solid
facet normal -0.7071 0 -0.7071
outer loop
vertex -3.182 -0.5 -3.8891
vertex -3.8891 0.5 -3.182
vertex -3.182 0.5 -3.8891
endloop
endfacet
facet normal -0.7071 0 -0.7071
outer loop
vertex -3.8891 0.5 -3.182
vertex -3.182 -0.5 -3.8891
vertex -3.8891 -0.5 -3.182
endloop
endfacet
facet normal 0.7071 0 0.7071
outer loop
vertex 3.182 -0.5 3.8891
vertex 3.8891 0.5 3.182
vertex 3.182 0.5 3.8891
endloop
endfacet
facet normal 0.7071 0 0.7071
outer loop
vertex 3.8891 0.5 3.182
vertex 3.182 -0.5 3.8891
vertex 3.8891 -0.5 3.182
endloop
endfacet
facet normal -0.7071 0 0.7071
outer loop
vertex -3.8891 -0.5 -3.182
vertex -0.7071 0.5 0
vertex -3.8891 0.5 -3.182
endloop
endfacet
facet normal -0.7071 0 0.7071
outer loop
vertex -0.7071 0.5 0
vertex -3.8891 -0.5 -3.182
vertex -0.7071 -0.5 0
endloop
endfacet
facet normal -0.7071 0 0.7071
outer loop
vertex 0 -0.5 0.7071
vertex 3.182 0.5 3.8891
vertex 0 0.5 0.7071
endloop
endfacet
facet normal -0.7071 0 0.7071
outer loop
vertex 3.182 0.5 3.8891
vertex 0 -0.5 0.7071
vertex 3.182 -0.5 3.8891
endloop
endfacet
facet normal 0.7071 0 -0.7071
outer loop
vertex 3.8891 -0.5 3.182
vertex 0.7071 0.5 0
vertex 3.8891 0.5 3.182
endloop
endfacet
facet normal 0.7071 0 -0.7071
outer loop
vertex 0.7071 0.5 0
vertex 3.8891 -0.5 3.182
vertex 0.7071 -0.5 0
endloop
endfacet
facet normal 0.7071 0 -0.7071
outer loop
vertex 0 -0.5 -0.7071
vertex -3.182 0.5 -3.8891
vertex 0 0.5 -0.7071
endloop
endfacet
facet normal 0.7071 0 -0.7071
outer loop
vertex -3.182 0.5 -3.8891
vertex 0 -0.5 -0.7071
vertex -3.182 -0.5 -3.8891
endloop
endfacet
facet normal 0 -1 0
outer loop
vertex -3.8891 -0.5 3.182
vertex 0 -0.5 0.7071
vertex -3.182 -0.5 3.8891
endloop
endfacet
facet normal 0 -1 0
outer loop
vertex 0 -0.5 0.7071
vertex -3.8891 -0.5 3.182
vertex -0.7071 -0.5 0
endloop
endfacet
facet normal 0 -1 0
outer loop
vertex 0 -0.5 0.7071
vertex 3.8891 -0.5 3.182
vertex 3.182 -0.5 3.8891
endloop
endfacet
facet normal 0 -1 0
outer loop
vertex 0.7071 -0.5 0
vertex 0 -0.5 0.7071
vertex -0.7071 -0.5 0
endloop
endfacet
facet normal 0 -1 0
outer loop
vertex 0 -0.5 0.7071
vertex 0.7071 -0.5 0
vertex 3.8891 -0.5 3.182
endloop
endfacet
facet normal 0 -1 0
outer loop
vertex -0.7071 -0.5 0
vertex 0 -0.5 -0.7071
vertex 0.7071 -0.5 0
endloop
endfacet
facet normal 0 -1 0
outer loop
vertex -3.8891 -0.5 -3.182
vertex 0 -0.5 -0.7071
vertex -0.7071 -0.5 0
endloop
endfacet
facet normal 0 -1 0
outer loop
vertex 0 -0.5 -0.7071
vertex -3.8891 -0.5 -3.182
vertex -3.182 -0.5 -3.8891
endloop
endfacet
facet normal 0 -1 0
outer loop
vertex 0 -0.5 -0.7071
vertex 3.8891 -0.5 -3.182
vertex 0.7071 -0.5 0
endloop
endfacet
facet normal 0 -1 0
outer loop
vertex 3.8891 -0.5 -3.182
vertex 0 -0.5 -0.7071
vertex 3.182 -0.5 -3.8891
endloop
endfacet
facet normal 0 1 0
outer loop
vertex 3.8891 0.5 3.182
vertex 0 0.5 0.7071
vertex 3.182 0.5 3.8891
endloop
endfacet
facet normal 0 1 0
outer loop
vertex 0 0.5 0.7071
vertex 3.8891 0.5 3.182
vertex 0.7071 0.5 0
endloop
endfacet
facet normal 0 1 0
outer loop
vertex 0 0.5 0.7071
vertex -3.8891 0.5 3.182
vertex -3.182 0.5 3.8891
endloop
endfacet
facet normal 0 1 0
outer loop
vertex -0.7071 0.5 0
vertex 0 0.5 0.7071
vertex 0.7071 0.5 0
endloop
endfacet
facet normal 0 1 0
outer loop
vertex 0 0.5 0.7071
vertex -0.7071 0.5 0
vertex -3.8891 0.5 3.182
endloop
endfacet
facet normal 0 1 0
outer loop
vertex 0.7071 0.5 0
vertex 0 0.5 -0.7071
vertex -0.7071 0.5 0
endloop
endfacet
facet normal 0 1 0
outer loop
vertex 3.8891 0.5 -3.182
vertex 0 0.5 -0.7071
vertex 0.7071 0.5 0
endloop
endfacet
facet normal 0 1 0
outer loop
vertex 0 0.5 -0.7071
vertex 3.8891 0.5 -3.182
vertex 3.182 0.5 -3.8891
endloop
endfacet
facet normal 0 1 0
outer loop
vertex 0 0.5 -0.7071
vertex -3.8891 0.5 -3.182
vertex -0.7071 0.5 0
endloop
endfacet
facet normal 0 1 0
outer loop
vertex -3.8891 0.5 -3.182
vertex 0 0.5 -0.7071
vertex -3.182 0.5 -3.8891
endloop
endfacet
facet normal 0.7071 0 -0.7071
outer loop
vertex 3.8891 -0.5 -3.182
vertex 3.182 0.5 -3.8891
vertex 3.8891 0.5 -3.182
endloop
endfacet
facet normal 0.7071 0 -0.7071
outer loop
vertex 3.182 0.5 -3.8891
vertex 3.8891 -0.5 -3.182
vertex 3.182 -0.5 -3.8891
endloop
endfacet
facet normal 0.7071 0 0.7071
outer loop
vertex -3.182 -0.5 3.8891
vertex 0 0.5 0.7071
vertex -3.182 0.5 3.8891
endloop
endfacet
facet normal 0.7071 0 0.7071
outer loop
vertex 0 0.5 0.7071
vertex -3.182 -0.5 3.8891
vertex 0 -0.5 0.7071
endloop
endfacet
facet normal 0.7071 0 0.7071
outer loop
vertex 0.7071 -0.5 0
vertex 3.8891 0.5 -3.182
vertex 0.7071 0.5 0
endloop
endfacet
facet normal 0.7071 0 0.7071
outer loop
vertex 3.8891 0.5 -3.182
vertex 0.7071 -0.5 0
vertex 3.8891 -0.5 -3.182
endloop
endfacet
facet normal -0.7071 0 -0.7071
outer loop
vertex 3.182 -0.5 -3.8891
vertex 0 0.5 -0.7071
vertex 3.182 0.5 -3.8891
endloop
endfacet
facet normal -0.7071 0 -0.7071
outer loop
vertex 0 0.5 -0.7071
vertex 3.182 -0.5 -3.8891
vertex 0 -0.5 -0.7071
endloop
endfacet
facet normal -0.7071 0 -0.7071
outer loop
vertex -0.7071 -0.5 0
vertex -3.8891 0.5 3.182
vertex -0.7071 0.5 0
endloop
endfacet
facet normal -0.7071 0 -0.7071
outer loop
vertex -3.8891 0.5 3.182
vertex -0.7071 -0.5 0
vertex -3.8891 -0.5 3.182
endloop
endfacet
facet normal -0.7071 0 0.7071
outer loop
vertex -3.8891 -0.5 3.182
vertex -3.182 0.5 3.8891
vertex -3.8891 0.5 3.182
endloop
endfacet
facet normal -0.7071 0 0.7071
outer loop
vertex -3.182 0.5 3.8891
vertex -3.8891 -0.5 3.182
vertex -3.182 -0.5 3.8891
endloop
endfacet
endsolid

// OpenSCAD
rotate([0,-45,0])
cube([10,1,1], center = true);

rotate([0,45,0])
cube([10,1,1], center = true);
